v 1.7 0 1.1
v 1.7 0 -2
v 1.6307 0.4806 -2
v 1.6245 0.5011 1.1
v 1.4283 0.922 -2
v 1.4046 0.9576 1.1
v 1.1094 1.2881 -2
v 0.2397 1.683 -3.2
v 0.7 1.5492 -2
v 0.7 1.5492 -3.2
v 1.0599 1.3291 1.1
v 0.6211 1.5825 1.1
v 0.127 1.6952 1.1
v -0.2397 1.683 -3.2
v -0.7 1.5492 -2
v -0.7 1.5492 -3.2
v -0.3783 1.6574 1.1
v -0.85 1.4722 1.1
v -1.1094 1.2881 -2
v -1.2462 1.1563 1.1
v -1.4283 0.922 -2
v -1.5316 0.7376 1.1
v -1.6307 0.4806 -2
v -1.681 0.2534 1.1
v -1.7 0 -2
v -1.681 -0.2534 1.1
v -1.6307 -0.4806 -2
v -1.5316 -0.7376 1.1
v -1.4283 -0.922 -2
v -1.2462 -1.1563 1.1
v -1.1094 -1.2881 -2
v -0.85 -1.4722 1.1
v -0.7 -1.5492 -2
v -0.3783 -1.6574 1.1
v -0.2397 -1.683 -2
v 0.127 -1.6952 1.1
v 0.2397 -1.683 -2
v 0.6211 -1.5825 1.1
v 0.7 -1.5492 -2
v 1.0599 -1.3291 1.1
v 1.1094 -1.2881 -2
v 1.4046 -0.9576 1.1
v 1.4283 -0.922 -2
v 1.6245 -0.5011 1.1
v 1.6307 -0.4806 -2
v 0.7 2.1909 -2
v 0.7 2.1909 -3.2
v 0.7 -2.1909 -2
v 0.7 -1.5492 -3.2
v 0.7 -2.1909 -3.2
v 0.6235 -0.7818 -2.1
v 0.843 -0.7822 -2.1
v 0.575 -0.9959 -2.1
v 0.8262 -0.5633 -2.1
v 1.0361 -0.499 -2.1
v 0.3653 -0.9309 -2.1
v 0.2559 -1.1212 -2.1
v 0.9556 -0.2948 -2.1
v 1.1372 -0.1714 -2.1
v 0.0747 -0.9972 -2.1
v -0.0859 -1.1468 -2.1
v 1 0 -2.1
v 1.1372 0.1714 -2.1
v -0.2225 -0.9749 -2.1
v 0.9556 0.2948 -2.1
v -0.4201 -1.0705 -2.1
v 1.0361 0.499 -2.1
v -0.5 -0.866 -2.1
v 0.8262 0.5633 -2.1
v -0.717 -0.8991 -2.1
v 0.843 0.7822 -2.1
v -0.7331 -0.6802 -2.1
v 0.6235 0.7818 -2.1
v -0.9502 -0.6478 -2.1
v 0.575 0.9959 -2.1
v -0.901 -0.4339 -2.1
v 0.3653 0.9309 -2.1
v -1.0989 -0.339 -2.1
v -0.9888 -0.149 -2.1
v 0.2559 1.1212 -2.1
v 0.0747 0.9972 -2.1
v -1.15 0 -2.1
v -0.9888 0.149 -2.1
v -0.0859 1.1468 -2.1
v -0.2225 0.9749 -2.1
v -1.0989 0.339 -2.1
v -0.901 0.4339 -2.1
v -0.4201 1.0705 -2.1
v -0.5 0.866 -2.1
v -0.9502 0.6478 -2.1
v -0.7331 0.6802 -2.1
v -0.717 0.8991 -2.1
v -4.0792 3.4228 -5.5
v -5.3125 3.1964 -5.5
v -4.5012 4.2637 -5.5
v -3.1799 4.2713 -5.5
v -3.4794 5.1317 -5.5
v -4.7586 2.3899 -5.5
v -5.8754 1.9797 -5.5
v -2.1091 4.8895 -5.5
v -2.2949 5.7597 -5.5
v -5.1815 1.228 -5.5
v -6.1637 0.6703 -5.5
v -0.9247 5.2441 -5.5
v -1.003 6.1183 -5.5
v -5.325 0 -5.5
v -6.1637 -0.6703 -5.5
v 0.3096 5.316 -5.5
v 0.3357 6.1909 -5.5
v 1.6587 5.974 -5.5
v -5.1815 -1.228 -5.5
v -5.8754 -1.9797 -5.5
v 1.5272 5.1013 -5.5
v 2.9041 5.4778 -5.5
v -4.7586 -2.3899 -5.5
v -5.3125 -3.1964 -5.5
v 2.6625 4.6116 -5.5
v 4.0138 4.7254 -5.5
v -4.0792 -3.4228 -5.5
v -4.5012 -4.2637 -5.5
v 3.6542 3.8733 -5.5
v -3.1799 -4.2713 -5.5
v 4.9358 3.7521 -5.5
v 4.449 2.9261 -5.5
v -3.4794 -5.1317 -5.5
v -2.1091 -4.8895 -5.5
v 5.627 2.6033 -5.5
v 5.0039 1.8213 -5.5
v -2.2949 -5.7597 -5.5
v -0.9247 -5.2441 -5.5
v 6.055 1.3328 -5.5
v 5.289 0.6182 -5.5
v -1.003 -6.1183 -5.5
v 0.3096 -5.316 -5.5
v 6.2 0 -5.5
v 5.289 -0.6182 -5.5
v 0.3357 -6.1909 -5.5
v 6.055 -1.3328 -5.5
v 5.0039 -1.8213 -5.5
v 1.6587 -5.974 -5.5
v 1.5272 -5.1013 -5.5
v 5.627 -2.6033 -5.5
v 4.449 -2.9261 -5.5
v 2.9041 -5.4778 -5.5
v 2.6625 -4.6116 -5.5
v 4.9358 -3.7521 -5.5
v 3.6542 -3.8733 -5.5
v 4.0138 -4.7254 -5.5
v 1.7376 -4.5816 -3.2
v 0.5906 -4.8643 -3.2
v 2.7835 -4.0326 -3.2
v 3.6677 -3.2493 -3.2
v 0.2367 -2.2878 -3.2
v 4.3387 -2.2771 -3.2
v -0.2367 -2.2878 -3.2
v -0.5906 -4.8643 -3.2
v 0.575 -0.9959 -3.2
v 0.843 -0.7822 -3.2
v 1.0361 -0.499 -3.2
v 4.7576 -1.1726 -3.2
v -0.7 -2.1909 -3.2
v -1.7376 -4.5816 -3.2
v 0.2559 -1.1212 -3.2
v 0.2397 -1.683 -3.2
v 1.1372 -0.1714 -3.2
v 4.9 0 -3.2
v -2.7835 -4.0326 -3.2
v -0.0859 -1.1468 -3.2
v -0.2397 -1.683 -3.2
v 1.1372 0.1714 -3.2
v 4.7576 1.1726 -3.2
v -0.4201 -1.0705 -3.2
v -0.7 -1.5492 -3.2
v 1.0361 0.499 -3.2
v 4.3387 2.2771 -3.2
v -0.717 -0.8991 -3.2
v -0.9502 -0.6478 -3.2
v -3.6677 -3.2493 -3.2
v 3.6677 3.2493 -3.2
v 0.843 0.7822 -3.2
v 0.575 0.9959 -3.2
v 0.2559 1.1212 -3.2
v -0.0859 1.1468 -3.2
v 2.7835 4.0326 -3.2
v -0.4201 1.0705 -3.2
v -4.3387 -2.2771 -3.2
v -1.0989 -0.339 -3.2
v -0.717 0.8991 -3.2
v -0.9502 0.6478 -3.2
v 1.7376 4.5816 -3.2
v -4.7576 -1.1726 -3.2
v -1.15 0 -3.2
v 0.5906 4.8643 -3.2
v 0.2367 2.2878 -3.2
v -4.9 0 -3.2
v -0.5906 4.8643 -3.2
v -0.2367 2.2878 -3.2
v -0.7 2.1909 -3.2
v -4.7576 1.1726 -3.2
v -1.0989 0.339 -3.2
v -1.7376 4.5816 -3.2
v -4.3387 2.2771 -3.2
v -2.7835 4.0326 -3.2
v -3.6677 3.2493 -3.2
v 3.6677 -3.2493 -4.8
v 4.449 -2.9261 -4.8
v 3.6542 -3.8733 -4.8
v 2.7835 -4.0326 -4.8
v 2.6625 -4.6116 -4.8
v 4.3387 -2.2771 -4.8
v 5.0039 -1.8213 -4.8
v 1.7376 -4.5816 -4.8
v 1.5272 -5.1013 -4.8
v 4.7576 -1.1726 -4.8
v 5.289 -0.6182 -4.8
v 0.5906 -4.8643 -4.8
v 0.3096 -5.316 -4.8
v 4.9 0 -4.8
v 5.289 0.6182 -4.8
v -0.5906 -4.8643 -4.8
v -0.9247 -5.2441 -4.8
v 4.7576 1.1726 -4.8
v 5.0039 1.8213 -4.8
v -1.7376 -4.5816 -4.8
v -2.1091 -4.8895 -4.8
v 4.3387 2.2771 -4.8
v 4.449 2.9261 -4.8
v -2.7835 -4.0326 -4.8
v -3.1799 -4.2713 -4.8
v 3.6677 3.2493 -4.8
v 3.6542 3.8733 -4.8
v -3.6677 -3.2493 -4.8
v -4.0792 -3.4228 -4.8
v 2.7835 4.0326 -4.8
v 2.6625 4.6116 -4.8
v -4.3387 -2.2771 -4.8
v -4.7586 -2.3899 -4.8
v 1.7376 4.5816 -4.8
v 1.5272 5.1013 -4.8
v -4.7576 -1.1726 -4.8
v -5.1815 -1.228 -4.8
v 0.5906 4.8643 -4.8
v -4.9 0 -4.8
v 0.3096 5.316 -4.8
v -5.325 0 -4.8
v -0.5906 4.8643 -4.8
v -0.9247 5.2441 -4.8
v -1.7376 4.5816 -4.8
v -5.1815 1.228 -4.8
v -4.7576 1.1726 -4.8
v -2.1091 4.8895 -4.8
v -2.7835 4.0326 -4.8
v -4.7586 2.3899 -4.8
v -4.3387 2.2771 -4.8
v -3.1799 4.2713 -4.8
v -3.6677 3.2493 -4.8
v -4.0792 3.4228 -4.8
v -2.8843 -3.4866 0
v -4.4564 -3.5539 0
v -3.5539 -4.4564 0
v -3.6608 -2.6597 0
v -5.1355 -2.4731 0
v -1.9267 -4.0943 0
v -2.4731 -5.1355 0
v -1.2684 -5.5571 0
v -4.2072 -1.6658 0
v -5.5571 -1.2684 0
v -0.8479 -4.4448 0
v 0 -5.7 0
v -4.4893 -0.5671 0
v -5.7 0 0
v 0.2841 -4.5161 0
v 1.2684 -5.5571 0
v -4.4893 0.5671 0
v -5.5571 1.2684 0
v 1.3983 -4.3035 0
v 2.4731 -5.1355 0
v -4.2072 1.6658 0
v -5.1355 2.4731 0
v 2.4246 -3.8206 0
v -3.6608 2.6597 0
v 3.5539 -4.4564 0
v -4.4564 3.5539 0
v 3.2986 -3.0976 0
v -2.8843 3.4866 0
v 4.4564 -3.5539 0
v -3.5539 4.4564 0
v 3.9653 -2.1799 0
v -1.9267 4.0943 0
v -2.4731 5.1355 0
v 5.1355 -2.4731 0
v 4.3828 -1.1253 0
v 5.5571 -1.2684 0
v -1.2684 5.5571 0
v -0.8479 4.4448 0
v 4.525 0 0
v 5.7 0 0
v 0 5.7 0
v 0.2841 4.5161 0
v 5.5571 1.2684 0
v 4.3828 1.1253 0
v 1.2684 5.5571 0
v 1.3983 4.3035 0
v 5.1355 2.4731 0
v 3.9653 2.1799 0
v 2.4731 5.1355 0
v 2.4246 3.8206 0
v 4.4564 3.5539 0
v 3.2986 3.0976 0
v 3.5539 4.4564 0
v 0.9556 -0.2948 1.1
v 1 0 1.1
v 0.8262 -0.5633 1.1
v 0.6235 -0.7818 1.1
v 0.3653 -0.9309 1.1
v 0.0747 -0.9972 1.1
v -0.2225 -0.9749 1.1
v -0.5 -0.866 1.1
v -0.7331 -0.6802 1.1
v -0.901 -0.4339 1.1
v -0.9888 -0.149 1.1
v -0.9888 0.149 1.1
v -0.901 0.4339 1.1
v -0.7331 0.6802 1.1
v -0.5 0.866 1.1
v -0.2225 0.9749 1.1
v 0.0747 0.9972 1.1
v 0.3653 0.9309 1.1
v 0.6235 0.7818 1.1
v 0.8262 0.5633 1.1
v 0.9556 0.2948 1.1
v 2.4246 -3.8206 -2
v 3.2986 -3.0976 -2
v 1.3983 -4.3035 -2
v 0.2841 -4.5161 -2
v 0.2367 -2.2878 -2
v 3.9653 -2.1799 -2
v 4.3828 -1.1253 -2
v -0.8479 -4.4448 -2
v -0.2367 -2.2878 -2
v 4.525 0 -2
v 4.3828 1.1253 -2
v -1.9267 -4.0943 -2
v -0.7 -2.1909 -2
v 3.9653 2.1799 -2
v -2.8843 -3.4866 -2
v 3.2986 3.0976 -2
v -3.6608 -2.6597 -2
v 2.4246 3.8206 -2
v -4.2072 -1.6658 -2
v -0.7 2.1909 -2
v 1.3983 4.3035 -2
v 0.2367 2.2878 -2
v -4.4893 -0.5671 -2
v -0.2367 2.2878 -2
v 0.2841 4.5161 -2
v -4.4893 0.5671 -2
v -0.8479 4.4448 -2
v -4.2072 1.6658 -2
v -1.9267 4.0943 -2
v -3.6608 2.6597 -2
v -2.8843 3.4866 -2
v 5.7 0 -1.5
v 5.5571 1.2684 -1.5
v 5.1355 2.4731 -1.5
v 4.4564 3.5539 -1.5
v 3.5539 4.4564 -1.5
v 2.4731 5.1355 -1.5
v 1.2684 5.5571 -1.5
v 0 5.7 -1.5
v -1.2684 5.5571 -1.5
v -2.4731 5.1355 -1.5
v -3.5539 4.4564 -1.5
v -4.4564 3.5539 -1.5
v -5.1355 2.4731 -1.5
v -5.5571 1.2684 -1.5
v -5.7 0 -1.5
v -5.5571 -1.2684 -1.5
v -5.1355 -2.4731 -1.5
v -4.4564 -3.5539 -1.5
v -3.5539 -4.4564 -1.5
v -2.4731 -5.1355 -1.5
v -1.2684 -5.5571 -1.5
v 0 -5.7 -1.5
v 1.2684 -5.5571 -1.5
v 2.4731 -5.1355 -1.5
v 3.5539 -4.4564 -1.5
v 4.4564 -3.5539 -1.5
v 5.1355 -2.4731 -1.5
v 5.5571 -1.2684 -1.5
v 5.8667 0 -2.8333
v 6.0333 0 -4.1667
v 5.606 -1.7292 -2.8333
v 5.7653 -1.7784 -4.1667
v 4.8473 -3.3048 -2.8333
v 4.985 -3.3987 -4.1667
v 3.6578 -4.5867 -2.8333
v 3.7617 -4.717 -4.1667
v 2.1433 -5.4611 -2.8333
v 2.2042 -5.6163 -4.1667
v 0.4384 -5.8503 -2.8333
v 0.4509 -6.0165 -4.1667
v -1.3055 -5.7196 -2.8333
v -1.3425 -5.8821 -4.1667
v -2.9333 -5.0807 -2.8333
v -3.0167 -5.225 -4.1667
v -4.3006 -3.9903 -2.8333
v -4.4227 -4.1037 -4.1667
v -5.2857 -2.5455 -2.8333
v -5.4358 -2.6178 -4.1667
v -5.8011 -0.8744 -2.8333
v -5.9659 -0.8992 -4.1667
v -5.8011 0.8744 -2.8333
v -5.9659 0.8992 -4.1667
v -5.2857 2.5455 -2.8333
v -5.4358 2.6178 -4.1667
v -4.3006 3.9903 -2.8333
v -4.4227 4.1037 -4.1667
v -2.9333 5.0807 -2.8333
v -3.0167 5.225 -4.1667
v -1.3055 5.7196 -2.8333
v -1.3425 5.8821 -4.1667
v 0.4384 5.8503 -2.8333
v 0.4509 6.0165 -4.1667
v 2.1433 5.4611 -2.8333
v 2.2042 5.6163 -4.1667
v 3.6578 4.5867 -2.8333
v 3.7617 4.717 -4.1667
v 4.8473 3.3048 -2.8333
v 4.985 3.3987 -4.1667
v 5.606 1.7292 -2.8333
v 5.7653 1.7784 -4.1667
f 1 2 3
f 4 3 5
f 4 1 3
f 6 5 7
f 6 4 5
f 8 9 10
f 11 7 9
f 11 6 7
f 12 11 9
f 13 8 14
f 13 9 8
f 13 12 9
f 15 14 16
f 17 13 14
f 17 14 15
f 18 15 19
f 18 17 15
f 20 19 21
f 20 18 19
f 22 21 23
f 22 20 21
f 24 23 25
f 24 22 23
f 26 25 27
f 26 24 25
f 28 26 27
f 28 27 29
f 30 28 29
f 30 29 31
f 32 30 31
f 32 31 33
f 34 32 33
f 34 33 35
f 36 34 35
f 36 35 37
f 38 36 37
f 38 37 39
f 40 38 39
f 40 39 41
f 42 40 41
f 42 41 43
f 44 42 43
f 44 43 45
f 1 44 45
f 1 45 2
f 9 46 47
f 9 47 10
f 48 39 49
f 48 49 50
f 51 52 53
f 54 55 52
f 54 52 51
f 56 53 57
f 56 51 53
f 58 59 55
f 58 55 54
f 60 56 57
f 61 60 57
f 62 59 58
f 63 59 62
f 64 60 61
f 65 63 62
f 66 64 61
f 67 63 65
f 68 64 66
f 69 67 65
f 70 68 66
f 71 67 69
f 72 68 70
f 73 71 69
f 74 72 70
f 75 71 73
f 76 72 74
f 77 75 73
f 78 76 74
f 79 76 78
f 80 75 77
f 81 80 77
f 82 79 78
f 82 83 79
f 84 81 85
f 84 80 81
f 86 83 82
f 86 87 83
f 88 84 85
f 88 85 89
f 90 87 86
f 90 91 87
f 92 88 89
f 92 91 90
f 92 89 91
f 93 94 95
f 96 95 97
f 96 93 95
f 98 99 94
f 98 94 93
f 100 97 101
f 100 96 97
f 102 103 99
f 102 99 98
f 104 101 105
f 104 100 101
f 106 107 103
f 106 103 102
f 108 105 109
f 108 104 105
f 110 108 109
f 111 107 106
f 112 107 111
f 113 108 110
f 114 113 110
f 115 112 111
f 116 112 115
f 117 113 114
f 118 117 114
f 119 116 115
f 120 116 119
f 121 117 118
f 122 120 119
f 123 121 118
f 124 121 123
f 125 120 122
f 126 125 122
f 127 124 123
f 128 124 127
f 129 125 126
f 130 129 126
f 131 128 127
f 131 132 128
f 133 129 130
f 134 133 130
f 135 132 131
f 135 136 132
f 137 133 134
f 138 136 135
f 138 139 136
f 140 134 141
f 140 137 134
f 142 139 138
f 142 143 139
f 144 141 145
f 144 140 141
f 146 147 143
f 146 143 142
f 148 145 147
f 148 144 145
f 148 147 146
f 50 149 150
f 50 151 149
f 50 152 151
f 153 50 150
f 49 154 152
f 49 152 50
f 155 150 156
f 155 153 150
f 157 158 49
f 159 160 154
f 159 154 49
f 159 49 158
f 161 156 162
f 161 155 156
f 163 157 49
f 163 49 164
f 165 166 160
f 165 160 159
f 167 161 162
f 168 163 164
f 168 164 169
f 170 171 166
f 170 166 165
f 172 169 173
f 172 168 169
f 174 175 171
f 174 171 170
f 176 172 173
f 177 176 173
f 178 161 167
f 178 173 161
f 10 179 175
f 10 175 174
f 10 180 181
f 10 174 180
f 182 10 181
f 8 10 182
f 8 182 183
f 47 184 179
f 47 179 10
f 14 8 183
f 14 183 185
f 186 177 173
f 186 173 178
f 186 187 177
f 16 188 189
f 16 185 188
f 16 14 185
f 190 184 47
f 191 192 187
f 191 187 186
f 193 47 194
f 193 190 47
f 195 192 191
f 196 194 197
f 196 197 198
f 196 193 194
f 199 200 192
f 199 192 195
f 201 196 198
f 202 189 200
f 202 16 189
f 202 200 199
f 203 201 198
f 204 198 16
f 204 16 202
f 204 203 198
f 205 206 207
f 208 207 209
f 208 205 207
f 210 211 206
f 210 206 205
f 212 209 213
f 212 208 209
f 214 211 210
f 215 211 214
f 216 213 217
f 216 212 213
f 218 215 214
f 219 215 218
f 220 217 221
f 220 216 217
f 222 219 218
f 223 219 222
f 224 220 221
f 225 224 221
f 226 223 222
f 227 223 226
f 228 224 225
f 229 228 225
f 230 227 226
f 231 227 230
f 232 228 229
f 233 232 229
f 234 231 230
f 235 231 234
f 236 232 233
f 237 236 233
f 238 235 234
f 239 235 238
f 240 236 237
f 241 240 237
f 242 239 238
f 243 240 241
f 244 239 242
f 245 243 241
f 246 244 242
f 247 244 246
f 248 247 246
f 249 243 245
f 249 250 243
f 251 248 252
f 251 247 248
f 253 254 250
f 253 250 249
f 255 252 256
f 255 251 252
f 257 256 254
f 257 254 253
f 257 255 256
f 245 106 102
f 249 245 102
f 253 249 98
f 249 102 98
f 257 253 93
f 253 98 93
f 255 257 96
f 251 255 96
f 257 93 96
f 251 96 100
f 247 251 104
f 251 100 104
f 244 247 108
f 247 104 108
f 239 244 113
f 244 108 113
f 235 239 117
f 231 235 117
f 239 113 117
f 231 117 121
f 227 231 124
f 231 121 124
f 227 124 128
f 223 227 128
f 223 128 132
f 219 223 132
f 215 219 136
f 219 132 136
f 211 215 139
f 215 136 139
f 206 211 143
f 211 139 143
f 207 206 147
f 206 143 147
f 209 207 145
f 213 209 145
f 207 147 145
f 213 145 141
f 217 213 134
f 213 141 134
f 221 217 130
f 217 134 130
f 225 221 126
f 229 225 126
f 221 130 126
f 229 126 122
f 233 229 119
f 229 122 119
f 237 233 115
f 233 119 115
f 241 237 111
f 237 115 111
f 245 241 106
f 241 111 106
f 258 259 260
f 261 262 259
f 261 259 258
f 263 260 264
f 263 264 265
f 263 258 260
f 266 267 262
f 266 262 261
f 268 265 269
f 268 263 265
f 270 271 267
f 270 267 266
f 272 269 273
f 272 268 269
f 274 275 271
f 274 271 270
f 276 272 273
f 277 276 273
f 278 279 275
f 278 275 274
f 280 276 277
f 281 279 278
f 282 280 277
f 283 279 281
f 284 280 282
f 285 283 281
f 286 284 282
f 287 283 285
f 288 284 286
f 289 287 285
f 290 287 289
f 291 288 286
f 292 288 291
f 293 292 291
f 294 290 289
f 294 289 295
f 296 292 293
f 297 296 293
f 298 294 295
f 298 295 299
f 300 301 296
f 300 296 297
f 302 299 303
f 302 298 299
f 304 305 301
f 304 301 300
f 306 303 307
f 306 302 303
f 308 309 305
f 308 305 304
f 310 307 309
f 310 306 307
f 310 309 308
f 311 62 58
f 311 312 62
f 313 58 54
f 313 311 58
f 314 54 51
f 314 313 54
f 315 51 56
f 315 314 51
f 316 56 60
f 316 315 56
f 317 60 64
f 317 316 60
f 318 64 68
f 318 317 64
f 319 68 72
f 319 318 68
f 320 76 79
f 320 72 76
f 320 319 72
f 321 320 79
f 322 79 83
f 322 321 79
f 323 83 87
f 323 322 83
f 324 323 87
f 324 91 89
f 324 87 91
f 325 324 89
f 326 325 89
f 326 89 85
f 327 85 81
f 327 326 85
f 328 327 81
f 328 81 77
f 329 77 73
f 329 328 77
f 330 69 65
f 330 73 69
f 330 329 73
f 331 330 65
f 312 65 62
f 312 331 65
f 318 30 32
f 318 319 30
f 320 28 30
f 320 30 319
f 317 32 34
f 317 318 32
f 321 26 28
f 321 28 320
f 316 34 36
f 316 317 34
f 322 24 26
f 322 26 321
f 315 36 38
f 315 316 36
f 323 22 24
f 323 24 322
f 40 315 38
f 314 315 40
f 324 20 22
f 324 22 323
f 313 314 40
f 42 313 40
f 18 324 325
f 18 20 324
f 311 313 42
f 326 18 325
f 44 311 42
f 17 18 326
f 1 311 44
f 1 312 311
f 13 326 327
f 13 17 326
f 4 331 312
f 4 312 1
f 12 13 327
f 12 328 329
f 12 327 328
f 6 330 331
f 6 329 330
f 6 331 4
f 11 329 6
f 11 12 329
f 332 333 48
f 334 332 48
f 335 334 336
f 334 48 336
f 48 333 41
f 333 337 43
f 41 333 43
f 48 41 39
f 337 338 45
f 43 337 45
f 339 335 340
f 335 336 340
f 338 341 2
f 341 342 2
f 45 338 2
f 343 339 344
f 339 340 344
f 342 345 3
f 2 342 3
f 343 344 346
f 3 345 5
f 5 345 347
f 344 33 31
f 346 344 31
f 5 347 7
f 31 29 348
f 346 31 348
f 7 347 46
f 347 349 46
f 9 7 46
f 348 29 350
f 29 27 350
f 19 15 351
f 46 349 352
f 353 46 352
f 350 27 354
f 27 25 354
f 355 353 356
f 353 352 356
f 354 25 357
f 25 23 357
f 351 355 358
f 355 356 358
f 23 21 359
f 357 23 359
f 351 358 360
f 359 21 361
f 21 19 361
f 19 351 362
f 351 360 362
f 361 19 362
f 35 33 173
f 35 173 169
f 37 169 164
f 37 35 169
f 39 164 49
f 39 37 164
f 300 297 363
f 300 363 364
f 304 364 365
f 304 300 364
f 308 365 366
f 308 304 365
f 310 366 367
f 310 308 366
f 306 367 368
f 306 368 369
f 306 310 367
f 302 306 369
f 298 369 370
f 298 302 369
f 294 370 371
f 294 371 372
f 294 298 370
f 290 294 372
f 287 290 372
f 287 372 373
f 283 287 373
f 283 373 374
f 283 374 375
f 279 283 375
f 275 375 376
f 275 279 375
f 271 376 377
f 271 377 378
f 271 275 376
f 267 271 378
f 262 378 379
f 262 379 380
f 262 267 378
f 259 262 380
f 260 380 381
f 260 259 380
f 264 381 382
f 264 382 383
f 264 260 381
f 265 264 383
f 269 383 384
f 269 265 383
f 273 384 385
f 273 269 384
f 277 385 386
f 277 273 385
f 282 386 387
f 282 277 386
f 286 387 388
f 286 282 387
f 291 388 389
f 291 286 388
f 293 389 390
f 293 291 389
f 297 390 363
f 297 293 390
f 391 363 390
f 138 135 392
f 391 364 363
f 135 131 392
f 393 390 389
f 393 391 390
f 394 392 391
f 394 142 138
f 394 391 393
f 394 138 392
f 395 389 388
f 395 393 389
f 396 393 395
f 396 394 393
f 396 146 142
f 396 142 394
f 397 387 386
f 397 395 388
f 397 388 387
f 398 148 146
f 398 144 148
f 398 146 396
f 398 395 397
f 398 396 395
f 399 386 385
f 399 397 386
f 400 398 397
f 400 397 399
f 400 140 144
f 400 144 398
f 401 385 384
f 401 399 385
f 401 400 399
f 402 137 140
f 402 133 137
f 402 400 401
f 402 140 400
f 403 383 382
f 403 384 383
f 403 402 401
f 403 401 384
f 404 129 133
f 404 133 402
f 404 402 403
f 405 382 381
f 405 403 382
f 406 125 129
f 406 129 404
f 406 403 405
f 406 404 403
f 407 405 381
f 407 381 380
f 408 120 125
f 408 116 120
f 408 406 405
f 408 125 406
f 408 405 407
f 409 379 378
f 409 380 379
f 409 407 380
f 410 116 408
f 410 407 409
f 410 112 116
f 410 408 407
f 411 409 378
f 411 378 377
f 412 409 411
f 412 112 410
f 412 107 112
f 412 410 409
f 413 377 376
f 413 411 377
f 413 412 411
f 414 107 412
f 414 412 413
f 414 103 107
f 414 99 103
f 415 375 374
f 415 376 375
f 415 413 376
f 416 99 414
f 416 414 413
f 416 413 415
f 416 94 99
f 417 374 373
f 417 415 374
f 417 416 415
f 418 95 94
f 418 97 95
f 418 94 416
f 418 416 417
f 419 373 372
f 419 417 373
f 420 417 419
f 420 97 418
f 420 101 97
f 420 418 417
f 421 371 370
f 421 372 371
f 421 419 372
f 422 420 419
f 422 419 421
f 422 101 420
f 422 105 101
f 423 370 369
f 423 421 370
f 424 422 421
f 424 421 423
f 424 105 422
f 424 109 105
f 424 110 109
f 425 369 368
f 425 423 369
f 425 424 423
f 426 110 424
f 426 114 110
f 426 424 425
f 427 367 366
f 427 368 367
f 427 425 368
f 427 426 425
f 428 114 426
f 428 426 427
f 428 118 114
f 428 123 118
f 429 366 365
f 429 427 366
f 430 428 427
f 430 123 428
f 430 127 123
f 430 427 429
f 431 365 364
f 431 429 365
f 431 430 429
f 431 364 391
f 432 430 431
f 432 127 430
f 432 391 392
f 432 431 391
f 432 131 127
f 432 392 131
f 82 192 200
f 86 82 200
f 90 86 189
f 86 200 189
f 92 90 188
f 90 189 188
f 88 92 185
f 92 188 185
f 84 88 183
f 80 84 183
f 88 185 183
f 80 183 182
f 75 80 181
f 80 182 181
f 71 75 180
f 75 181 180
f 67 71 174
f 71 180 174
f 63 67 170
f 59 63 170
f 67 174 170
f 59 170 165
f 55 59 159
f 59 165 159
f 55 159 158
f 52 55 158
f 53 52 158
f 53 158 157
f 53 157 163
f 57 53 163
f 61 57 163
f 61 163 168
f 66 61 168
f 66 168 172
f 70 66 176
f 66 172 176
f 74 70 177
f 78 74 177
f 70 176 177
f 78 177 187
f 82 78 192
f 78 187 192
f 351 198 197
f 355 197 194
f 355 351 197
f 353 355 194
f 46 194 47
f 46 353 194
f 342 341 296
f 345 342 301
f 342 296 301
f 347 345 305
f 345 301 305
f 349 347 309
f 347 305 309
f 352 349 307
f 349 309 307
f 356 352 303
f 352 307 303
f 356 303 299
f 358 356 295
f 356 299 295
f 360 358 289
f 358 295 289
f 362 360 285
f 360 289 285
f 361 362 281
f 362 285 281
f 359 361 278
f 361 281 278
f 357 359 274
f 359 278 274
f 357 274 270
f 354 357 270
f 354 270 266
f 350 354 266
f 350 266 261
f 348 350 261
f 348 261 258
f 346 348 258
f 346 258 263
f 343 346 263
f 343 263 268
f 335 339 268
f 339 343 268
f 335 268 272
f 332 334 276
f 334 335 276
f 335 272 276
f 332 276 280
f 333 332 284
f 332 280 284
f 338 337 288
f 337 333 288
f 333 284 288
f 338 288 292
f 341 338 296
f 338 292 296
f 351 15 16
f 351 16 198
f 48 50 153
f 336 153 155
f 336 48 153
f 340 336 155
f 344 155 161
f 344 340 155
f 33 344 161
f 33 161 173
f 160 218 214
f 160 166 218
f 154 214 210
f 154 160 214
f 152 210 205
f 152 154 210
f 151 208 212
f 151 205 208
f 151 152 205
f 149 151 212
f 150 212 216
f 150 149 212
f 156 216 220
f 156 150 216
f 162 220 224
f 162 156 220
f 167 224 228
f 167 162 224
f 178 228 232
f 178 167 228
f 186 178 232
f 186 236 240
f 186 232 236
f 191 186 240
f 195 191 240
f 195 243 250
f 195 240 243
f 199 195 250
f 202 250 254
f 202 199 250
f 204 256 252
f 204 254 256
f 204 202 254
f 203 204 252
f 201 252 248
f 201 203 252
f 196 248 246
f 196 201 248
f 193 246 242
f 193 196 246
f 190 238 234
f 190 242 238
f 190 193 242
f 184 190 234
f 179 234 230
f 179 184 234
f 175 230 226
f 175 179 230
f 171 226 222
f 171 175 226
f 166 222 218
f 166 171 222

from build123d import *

# Parameters (mm, degrees)
SKETCH_1_R           = 1.7
SKETCH_1_R_2         = 1
EXTRUDE_1_DEPTH      = 1.1
EXTRUDE_1_DEPTH_BACK = 2
SKETCH_1_3_R         = 5.7
SKETCH_1_3_R_2       = 4.525
EXTRUDE_2_DEPTH      = 1.5
SKETCH_2_R           = 5
EXTRUDE_3_DEPTH      = 1.2
SKETCH_2_5_R         = 1
CUT_EXTRUDE_3_DEPTH  = 2.2
SKETCH_6_R           = 1.15
CUT_EXTRUDE_4_DEPTH  = 1.1
SKETCH_4_W           = 0.5
SKETCH_4_H           = 0.375
SKETCH_7_R           = 5.325
CUT_EXTRUDE_5_DEPTH  = 0.7


with BuildPart() as part:
    # Sketch 1 → Extrude 1 (new body, two sides)
    with BuildSketch(Plane.XY) as extrude_1_sk:
        Circle(SKETCH_1_R)
        Circle(SKETCH_1_R_2, mode=Mode.SUBTRACT)
    extrude(amount=EXTRUDE_1_DEPTH)
    extrude(extrude_1_sk.sketch, amount=-EXTRUDE_1_DEPTH_BACK)

    # Sketch 2 → Extrude 3 (add)
    with BuildSketch(Plane(origin=(0, 0, -2), x_dir=(-1, 0, 0), z_dir=(0, 0, -1))):
        Circle(SKETCH_2_R)
    extrude(amount=EXTRUDE_3_DEPTH)

    # Sketch 2_5 → Cut-Extrude 3 (cut, through all)
    with BuildSketch(Plane(origin=(0, 0, -2), x_dir=(-1, 0, 0), z_dir=(0, 0, -1))):
        with BuildLine():
            Line((-0.7, -1.549193338), (-0.7, -2.19089023))
            ThreePointArc((-0.7, -2.19089023), (0, -2.3), (0.7, -2.19089023))
            Line((0.7, -2.19089023), (0.7, -1.549193338))
            ThreePointArc((0.7, -1.549193338), (0, -1.7), (-0.7, -1.549193338))
        make_face()
        with BuildLine():
            ThreePointArc((0.7, 2.19089023), (0, 2.3), (-0.7, 2.19089023))
            Line((-0.7, 2.19089023), (-0.7, 1.549193338))
            ThreePointArc((-0.7, 1.549193338), (0, 1.7), (0.7, 1.549193338))
            Line((0.7, 1.549193338), (0.7, 2.19089023))
        make_face()
        with BuildLine():
            Line((-0.7, -1.549193338), (-0.7, -2.19089023))
            ThreePointArc((-0.7, -2.19089023), (0, -2.3), (0.7, -2.19089023))
            Line((0.7, -2.19089023), (0.7, -1.549193338))
            ThreePointArc((0.7, -1.549193338), (0, -1.7), (-0.7, -1.549193338))
        make_face()
        with BuildLine():
            ThreePointArc((0.7, 2.19089023), (0, 2.3), (-0.7, 2.19089023))
            Line((-0.7, 2.19089023), (-0.7, 1.549193338))
            ThreePointArc((-0.7, 1.549193338), (0, 1.7), (0.7, 1.549193338))
            Line((0.7, 1.549193338), (0.7, 2.19089023))
        make_face()
        with Locations(Location((0, 0, 0), (0, 0, 180))):  # turned: the seam where the file's is
            Circle(SKETCH_2_5_R)
    extrude(amount=CUT_EXTRUDE_3_DEPTH, mode=Mode.SUBTRACT)

    # Sketch 6 → Cut-Extrude 4 (cut)
    with BuildSketch(Plane(origin=(0, 0, -3.2), x_dir=(-1, 0, 0), z_dir=(0, 0, -1))):
        Circle(SKETCH_6_R)
    extrude(amount=-CUT_EXTRUDE_4_DEPTH, mode=Mode.SUBTRACT)



with BuildPart() as body_2:
    # Sketch 1_3 → Extrude 2 (new body)
    with BuildSketch(Plane.XY):
        Circle(SKETCH_1_3_R)
        Circle(SKETCH_1_3_R_2, mode=Mode.SUBTRACT)
    extrude(amount=-EXTRUDE_2_DEPTH)


with BuildPart() as part_1:
    add(part.part)

    add(body_2.part)  # Revolve 2 merges body 2
    # Sketch 4 → Revolve 2 (revolve)
    with BuildSketch(Plane(origin=(0, 0, 0), x_dir=(0, 0, -1), z_dir=(1, 0, 0)), mode=Mode.PRIVATE) as revolve_2_sk:
        Polygon((1.5, 5.7), (5.5, 6.2), (5.5, 4.9), (1.5, 4.9), align=None)
        with Locations((1.75, 4.7125)):
            Rectangle(SKETCH_4_W, SKETCH_4_H)
    revolve(revolve_2_sk.sketch.rotate(Axis((0, 0, 1000), (0, 0, -1)), 90), axis=Axis((0, 0, 1000), (0, 0, -1)))  # turned: the seam where the file's is

    # Sketch 7 → Cut-Extrude 5 (cut)
    with BuildSketch(Plane(origin=(0, 0, -5.5), x_dir=(-1, 0, 0), z_dir=(0, 0, -1))):
        Circle(SKETCH_7_R)
    extrude(amount=-CUT_EXTRUDE_5_DEPTH, mode=Mode.SUBTRACT)


solid = part_1.part
